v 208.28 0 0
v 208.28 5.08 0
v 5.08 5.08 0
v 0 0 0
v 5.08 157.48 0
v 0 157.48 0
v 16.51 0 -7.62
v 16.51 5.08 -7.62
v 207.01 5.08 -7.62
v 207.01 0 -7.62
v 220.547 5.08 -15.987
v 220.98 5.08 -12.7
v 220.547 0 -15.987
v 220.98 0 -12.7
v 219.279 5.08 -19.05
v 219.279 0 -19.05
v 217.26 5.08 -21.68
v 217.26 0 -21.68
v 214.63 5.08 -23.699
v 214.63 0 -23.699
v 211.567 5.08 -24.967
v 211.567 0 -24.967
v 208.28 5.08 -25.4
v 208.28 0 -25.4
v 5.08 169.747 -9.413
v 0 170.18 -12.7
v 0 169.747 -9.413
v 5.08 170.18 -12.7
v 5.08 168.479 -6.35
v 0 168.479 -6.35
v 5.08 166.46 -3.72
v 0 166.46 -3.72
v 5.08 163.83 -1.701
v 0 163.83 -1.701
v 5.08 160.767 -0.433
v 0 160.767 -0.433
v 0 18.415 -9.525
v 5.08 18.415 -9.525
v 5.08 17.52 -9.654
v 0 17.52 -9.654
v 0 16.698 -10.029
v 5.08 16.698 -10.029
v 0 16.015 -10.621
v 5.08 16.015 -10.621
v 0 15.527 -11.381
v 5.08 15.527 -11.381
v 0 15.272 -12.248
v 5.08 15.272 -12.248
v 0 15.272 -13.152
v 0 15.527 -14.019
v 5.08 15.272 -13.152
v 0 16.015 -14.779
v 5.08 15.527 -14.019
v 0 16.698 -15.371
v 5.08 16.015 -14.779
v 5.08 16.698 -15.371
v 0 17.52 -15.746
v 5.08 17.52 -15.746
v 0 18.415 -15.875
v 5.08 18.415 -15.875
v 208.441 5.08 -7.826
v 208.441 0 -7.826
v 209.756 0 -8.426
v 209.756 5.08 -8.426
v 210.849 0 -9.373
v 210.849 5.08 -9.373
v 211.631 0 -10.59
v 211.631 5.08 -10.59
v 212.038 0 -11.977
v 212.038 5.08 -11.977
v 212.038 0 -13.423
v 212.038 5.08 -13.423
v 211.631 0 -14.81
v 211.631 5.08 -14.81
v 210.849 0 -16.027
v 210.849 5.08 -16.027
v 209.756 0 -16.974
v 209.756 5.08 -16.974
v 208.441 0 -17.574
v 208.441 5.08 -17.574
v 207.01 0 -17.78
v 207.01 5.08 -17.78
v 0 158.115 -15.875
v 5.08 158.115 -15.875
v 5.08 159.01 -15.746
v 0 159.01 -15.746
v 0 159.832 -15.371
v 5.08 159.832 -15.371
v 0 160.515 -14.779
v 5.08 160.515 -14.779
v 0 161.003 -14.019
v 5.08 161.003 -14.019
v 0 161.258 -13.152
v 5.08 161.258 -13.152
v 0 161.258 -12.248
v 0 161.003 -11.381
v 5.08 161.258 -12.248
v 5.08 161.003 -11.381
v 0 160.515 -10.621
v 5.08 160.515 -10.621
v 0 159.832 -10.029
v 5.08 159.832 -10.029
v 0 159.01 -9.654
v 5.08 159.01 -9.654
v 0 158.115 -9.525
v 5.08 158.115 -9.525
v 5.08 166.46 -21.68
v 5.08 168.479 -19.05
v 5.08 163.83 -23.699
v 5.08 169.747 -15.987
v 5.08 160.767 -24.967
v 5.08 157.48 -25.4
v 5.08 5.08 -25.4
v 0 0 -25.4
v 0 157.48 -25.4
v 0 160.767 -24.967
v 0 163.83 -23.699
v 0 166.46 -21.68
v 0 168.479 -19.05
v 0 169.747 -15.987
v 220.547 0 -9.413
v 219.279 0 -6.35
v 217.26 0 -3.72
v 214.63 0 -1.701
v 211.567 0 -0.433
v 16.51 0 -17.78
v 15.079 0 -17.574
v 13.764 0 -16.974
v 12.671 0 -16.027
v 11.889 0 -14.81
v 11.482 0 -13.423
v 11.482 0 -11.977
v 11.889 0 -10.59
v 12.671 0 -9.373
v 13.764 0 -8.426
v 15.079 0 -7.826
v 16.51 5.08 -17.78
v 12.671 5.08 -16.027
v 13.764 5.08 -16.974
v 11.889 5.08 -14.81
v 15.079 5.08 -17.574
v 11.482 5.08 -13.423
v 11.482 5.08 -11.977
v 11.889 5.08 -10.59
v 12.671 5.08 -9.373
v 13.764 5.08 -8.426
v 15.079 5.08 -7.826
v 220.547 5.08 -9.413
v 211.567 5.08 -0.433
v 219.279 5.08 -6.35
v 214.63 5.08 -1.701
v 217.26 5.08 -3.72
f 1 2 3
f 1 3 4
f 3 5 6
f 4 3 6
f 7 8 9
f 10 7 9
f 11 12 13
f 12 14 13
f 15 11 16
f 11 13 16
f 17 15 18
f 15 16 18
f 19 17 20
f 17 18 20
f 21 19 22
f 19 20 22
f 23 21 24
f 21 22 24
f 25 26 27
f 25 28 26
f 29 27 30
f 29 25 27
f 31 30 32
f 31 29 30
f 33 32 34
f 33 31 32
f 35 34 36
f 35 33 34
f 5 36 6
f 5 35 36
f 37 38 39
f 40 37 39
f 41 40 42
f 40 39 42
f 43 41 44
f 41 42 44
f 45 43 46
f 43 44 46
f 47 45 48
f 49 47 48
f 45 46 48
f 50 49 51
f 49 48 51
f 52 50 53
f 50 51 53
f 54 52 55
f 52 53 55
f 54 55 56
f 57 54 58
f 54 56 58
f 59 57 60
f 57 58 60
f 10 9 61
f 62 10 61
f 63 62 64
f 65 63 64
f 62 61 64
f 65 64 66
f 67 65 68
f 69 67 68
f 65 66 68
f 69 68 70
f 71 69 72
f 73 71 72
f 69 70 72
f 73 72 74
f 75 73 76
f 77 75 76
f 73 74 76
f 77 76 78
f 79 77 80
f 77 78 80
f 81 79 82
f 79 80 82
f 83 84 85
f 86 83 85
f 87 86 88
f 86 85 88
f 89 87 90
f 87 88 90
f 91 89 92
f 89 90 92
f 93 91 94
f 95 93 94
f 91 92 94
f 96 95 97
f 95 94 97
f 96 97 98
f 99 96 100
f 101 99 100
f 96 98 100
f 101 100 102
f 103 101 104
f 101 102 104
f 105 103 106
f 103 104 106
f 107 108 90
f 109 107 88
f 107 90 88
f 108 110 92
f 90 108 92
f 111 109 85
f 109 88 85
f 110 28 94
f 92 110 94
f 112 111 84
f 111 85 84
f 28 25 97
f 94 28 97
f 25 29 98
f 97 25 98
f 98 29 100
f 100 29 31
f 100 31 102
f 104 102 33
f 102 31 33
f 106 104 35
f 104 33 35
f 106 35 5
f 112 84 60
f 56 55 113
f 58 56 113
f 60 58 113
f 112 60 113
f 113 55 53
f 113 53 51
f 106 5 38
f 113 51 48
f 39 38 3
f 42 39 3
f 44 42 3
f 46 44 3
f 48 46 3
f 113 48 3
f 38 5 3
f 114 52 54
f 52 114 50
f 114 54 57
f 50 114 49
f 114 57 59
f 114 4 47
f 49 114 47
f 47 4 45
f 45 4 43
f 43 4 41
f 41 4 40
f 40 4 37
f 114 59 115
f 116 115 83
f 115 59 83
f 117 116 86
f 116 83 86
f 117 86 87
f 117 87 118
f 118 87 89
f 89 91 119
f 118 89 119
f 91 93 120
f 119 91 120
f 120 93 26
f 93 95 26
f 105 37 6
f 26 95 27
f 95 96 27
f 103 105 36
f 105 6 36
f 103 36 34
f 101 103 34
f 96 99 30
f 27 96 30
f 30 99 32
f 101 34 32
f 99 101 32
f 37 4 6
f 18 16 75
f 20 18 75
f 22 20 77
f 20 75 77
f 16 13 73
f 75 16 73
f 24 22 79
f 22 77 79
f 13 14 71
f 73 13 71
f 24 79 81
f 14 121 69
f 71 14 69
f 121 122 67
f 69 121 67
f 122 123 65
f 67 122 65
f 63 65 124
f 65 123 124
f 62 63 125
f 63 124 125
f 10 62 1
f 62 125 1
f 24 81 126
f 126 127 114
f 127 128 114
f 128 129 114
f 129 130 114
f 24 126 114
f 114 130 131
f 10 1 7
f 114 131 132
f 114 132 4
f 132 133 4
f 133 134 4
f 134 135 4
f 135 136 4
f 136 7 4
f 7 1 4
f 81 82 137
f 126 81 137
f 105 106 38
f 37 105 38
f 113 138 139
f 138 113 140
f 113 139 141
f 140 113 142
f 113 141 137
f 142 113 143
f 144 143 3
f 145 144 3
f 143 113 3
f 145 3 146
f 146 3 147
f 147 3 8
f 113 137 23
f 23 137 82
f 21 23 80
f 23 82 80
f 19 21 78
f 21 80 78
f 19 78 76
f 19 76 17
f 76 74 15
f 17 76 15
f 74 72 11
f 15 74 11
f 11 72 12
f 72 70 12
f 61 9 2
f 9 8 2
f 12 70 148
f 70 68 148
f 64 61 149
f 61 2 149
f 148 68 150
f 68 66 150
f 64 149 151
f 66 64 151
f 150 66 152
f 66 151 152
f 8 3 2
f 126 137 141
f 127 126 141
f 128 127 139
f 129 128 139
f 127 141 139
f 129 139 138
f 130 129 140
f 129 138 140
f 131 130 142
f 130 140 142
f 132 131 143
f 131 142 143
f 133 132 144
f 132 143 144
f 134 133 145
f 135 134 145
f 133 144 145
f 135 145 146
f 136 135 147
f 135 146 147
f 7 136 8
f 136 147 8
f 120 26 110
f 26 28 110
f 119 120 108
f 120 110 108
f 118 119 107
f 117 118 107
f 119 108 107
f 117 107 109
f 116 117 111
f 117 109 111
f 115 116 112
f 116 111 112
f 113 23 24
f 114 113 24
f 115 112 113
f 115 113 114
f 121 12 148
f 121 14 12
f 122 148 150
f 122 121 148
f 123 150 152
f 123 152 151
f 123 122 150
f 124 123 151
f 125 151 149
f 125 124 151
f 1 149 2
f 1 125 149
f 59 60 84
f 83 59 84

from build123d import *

# Parameters (mm, degrees)
BOSS_EXTRUDE1_DEPTH = 25.4
FILLET1_R           = 12.7
CUT_EXTRUDE1_DEPTH  = 25.4
CUT_EXTRUDE3_DEPTH  = 25.4


with BuildPart() as part:
    # Sketch1 → Boss-Extrude1 (new body)
    with BuildSketch(Plane.XY):
        Polygon((0, 170.18), (5.08, 170.18), (5.08, 5.08), (220.98, 5.08), (220.98, 0), (0, 0), align=None)
    extrude(amount=-BOSS_EXTRUDE1_DEPTH)

    # Fillet1
    fillet1_edges = [part.edges().sort_by_distance(p)[0] for p in [
        (220.98, 2.54, -25.4),
        (220.98, 2.54, 0),
        (2.54, 170.18, -25.4),
        (2.54, 170.18, 0),
    ]]
    fillet(fillet1_edges, radius=FILLET1_R - 0.0001)  # a hair under: the kernel refuses the full size

    # Sketch4 → Cut-Extrude1 (cut)
    with BuildSketch(Plane(origin=(5.08, 0, 0), x_dir=(0, 0, -1), z_dir=(1, 0, 0))):
        with BuildLine():
            Line((9.525, 158.115), (9.525, 18.415))
            ThreePointArc((9.525, 18.415), (12.7, 15.24), (15.875, 18.415))
            Line((15.875, 18.415), (15.875, 158.115))
            ThreePointArc((15.875, 158.115), (12.7, 161.29), (9.525, 158.115))
        make_face()
    extrude(amount=-CUT_EXTRUDE1_DEPTH, mode=Mode.SUBTRACT)

    # Sketch5 → Cut-Extrude3 (cut)
    with BuildSketch(Plane(origin=(0, 5.08, 0), x_dir=(1, 0, 0), z_dir=(0, 1, 0))):
        with BuildLine():
            Line((207.01, 17.78), (16.51, 17.78))
            ThreePointArc((16.51, 17.78), (11.43, 12.7), (16.51, 7.62))
            Line((16.51, 7.62), (207.01, 7.62))
            ThreePointArc((207.01, 7.62), (212.09, 12.7), (207.01, 17.78))
        make_face()
    extrude(amount=-CUT_EXTRUDE3_DEPTH, mode=Mode.SUBTRACT)


solid = part.part
